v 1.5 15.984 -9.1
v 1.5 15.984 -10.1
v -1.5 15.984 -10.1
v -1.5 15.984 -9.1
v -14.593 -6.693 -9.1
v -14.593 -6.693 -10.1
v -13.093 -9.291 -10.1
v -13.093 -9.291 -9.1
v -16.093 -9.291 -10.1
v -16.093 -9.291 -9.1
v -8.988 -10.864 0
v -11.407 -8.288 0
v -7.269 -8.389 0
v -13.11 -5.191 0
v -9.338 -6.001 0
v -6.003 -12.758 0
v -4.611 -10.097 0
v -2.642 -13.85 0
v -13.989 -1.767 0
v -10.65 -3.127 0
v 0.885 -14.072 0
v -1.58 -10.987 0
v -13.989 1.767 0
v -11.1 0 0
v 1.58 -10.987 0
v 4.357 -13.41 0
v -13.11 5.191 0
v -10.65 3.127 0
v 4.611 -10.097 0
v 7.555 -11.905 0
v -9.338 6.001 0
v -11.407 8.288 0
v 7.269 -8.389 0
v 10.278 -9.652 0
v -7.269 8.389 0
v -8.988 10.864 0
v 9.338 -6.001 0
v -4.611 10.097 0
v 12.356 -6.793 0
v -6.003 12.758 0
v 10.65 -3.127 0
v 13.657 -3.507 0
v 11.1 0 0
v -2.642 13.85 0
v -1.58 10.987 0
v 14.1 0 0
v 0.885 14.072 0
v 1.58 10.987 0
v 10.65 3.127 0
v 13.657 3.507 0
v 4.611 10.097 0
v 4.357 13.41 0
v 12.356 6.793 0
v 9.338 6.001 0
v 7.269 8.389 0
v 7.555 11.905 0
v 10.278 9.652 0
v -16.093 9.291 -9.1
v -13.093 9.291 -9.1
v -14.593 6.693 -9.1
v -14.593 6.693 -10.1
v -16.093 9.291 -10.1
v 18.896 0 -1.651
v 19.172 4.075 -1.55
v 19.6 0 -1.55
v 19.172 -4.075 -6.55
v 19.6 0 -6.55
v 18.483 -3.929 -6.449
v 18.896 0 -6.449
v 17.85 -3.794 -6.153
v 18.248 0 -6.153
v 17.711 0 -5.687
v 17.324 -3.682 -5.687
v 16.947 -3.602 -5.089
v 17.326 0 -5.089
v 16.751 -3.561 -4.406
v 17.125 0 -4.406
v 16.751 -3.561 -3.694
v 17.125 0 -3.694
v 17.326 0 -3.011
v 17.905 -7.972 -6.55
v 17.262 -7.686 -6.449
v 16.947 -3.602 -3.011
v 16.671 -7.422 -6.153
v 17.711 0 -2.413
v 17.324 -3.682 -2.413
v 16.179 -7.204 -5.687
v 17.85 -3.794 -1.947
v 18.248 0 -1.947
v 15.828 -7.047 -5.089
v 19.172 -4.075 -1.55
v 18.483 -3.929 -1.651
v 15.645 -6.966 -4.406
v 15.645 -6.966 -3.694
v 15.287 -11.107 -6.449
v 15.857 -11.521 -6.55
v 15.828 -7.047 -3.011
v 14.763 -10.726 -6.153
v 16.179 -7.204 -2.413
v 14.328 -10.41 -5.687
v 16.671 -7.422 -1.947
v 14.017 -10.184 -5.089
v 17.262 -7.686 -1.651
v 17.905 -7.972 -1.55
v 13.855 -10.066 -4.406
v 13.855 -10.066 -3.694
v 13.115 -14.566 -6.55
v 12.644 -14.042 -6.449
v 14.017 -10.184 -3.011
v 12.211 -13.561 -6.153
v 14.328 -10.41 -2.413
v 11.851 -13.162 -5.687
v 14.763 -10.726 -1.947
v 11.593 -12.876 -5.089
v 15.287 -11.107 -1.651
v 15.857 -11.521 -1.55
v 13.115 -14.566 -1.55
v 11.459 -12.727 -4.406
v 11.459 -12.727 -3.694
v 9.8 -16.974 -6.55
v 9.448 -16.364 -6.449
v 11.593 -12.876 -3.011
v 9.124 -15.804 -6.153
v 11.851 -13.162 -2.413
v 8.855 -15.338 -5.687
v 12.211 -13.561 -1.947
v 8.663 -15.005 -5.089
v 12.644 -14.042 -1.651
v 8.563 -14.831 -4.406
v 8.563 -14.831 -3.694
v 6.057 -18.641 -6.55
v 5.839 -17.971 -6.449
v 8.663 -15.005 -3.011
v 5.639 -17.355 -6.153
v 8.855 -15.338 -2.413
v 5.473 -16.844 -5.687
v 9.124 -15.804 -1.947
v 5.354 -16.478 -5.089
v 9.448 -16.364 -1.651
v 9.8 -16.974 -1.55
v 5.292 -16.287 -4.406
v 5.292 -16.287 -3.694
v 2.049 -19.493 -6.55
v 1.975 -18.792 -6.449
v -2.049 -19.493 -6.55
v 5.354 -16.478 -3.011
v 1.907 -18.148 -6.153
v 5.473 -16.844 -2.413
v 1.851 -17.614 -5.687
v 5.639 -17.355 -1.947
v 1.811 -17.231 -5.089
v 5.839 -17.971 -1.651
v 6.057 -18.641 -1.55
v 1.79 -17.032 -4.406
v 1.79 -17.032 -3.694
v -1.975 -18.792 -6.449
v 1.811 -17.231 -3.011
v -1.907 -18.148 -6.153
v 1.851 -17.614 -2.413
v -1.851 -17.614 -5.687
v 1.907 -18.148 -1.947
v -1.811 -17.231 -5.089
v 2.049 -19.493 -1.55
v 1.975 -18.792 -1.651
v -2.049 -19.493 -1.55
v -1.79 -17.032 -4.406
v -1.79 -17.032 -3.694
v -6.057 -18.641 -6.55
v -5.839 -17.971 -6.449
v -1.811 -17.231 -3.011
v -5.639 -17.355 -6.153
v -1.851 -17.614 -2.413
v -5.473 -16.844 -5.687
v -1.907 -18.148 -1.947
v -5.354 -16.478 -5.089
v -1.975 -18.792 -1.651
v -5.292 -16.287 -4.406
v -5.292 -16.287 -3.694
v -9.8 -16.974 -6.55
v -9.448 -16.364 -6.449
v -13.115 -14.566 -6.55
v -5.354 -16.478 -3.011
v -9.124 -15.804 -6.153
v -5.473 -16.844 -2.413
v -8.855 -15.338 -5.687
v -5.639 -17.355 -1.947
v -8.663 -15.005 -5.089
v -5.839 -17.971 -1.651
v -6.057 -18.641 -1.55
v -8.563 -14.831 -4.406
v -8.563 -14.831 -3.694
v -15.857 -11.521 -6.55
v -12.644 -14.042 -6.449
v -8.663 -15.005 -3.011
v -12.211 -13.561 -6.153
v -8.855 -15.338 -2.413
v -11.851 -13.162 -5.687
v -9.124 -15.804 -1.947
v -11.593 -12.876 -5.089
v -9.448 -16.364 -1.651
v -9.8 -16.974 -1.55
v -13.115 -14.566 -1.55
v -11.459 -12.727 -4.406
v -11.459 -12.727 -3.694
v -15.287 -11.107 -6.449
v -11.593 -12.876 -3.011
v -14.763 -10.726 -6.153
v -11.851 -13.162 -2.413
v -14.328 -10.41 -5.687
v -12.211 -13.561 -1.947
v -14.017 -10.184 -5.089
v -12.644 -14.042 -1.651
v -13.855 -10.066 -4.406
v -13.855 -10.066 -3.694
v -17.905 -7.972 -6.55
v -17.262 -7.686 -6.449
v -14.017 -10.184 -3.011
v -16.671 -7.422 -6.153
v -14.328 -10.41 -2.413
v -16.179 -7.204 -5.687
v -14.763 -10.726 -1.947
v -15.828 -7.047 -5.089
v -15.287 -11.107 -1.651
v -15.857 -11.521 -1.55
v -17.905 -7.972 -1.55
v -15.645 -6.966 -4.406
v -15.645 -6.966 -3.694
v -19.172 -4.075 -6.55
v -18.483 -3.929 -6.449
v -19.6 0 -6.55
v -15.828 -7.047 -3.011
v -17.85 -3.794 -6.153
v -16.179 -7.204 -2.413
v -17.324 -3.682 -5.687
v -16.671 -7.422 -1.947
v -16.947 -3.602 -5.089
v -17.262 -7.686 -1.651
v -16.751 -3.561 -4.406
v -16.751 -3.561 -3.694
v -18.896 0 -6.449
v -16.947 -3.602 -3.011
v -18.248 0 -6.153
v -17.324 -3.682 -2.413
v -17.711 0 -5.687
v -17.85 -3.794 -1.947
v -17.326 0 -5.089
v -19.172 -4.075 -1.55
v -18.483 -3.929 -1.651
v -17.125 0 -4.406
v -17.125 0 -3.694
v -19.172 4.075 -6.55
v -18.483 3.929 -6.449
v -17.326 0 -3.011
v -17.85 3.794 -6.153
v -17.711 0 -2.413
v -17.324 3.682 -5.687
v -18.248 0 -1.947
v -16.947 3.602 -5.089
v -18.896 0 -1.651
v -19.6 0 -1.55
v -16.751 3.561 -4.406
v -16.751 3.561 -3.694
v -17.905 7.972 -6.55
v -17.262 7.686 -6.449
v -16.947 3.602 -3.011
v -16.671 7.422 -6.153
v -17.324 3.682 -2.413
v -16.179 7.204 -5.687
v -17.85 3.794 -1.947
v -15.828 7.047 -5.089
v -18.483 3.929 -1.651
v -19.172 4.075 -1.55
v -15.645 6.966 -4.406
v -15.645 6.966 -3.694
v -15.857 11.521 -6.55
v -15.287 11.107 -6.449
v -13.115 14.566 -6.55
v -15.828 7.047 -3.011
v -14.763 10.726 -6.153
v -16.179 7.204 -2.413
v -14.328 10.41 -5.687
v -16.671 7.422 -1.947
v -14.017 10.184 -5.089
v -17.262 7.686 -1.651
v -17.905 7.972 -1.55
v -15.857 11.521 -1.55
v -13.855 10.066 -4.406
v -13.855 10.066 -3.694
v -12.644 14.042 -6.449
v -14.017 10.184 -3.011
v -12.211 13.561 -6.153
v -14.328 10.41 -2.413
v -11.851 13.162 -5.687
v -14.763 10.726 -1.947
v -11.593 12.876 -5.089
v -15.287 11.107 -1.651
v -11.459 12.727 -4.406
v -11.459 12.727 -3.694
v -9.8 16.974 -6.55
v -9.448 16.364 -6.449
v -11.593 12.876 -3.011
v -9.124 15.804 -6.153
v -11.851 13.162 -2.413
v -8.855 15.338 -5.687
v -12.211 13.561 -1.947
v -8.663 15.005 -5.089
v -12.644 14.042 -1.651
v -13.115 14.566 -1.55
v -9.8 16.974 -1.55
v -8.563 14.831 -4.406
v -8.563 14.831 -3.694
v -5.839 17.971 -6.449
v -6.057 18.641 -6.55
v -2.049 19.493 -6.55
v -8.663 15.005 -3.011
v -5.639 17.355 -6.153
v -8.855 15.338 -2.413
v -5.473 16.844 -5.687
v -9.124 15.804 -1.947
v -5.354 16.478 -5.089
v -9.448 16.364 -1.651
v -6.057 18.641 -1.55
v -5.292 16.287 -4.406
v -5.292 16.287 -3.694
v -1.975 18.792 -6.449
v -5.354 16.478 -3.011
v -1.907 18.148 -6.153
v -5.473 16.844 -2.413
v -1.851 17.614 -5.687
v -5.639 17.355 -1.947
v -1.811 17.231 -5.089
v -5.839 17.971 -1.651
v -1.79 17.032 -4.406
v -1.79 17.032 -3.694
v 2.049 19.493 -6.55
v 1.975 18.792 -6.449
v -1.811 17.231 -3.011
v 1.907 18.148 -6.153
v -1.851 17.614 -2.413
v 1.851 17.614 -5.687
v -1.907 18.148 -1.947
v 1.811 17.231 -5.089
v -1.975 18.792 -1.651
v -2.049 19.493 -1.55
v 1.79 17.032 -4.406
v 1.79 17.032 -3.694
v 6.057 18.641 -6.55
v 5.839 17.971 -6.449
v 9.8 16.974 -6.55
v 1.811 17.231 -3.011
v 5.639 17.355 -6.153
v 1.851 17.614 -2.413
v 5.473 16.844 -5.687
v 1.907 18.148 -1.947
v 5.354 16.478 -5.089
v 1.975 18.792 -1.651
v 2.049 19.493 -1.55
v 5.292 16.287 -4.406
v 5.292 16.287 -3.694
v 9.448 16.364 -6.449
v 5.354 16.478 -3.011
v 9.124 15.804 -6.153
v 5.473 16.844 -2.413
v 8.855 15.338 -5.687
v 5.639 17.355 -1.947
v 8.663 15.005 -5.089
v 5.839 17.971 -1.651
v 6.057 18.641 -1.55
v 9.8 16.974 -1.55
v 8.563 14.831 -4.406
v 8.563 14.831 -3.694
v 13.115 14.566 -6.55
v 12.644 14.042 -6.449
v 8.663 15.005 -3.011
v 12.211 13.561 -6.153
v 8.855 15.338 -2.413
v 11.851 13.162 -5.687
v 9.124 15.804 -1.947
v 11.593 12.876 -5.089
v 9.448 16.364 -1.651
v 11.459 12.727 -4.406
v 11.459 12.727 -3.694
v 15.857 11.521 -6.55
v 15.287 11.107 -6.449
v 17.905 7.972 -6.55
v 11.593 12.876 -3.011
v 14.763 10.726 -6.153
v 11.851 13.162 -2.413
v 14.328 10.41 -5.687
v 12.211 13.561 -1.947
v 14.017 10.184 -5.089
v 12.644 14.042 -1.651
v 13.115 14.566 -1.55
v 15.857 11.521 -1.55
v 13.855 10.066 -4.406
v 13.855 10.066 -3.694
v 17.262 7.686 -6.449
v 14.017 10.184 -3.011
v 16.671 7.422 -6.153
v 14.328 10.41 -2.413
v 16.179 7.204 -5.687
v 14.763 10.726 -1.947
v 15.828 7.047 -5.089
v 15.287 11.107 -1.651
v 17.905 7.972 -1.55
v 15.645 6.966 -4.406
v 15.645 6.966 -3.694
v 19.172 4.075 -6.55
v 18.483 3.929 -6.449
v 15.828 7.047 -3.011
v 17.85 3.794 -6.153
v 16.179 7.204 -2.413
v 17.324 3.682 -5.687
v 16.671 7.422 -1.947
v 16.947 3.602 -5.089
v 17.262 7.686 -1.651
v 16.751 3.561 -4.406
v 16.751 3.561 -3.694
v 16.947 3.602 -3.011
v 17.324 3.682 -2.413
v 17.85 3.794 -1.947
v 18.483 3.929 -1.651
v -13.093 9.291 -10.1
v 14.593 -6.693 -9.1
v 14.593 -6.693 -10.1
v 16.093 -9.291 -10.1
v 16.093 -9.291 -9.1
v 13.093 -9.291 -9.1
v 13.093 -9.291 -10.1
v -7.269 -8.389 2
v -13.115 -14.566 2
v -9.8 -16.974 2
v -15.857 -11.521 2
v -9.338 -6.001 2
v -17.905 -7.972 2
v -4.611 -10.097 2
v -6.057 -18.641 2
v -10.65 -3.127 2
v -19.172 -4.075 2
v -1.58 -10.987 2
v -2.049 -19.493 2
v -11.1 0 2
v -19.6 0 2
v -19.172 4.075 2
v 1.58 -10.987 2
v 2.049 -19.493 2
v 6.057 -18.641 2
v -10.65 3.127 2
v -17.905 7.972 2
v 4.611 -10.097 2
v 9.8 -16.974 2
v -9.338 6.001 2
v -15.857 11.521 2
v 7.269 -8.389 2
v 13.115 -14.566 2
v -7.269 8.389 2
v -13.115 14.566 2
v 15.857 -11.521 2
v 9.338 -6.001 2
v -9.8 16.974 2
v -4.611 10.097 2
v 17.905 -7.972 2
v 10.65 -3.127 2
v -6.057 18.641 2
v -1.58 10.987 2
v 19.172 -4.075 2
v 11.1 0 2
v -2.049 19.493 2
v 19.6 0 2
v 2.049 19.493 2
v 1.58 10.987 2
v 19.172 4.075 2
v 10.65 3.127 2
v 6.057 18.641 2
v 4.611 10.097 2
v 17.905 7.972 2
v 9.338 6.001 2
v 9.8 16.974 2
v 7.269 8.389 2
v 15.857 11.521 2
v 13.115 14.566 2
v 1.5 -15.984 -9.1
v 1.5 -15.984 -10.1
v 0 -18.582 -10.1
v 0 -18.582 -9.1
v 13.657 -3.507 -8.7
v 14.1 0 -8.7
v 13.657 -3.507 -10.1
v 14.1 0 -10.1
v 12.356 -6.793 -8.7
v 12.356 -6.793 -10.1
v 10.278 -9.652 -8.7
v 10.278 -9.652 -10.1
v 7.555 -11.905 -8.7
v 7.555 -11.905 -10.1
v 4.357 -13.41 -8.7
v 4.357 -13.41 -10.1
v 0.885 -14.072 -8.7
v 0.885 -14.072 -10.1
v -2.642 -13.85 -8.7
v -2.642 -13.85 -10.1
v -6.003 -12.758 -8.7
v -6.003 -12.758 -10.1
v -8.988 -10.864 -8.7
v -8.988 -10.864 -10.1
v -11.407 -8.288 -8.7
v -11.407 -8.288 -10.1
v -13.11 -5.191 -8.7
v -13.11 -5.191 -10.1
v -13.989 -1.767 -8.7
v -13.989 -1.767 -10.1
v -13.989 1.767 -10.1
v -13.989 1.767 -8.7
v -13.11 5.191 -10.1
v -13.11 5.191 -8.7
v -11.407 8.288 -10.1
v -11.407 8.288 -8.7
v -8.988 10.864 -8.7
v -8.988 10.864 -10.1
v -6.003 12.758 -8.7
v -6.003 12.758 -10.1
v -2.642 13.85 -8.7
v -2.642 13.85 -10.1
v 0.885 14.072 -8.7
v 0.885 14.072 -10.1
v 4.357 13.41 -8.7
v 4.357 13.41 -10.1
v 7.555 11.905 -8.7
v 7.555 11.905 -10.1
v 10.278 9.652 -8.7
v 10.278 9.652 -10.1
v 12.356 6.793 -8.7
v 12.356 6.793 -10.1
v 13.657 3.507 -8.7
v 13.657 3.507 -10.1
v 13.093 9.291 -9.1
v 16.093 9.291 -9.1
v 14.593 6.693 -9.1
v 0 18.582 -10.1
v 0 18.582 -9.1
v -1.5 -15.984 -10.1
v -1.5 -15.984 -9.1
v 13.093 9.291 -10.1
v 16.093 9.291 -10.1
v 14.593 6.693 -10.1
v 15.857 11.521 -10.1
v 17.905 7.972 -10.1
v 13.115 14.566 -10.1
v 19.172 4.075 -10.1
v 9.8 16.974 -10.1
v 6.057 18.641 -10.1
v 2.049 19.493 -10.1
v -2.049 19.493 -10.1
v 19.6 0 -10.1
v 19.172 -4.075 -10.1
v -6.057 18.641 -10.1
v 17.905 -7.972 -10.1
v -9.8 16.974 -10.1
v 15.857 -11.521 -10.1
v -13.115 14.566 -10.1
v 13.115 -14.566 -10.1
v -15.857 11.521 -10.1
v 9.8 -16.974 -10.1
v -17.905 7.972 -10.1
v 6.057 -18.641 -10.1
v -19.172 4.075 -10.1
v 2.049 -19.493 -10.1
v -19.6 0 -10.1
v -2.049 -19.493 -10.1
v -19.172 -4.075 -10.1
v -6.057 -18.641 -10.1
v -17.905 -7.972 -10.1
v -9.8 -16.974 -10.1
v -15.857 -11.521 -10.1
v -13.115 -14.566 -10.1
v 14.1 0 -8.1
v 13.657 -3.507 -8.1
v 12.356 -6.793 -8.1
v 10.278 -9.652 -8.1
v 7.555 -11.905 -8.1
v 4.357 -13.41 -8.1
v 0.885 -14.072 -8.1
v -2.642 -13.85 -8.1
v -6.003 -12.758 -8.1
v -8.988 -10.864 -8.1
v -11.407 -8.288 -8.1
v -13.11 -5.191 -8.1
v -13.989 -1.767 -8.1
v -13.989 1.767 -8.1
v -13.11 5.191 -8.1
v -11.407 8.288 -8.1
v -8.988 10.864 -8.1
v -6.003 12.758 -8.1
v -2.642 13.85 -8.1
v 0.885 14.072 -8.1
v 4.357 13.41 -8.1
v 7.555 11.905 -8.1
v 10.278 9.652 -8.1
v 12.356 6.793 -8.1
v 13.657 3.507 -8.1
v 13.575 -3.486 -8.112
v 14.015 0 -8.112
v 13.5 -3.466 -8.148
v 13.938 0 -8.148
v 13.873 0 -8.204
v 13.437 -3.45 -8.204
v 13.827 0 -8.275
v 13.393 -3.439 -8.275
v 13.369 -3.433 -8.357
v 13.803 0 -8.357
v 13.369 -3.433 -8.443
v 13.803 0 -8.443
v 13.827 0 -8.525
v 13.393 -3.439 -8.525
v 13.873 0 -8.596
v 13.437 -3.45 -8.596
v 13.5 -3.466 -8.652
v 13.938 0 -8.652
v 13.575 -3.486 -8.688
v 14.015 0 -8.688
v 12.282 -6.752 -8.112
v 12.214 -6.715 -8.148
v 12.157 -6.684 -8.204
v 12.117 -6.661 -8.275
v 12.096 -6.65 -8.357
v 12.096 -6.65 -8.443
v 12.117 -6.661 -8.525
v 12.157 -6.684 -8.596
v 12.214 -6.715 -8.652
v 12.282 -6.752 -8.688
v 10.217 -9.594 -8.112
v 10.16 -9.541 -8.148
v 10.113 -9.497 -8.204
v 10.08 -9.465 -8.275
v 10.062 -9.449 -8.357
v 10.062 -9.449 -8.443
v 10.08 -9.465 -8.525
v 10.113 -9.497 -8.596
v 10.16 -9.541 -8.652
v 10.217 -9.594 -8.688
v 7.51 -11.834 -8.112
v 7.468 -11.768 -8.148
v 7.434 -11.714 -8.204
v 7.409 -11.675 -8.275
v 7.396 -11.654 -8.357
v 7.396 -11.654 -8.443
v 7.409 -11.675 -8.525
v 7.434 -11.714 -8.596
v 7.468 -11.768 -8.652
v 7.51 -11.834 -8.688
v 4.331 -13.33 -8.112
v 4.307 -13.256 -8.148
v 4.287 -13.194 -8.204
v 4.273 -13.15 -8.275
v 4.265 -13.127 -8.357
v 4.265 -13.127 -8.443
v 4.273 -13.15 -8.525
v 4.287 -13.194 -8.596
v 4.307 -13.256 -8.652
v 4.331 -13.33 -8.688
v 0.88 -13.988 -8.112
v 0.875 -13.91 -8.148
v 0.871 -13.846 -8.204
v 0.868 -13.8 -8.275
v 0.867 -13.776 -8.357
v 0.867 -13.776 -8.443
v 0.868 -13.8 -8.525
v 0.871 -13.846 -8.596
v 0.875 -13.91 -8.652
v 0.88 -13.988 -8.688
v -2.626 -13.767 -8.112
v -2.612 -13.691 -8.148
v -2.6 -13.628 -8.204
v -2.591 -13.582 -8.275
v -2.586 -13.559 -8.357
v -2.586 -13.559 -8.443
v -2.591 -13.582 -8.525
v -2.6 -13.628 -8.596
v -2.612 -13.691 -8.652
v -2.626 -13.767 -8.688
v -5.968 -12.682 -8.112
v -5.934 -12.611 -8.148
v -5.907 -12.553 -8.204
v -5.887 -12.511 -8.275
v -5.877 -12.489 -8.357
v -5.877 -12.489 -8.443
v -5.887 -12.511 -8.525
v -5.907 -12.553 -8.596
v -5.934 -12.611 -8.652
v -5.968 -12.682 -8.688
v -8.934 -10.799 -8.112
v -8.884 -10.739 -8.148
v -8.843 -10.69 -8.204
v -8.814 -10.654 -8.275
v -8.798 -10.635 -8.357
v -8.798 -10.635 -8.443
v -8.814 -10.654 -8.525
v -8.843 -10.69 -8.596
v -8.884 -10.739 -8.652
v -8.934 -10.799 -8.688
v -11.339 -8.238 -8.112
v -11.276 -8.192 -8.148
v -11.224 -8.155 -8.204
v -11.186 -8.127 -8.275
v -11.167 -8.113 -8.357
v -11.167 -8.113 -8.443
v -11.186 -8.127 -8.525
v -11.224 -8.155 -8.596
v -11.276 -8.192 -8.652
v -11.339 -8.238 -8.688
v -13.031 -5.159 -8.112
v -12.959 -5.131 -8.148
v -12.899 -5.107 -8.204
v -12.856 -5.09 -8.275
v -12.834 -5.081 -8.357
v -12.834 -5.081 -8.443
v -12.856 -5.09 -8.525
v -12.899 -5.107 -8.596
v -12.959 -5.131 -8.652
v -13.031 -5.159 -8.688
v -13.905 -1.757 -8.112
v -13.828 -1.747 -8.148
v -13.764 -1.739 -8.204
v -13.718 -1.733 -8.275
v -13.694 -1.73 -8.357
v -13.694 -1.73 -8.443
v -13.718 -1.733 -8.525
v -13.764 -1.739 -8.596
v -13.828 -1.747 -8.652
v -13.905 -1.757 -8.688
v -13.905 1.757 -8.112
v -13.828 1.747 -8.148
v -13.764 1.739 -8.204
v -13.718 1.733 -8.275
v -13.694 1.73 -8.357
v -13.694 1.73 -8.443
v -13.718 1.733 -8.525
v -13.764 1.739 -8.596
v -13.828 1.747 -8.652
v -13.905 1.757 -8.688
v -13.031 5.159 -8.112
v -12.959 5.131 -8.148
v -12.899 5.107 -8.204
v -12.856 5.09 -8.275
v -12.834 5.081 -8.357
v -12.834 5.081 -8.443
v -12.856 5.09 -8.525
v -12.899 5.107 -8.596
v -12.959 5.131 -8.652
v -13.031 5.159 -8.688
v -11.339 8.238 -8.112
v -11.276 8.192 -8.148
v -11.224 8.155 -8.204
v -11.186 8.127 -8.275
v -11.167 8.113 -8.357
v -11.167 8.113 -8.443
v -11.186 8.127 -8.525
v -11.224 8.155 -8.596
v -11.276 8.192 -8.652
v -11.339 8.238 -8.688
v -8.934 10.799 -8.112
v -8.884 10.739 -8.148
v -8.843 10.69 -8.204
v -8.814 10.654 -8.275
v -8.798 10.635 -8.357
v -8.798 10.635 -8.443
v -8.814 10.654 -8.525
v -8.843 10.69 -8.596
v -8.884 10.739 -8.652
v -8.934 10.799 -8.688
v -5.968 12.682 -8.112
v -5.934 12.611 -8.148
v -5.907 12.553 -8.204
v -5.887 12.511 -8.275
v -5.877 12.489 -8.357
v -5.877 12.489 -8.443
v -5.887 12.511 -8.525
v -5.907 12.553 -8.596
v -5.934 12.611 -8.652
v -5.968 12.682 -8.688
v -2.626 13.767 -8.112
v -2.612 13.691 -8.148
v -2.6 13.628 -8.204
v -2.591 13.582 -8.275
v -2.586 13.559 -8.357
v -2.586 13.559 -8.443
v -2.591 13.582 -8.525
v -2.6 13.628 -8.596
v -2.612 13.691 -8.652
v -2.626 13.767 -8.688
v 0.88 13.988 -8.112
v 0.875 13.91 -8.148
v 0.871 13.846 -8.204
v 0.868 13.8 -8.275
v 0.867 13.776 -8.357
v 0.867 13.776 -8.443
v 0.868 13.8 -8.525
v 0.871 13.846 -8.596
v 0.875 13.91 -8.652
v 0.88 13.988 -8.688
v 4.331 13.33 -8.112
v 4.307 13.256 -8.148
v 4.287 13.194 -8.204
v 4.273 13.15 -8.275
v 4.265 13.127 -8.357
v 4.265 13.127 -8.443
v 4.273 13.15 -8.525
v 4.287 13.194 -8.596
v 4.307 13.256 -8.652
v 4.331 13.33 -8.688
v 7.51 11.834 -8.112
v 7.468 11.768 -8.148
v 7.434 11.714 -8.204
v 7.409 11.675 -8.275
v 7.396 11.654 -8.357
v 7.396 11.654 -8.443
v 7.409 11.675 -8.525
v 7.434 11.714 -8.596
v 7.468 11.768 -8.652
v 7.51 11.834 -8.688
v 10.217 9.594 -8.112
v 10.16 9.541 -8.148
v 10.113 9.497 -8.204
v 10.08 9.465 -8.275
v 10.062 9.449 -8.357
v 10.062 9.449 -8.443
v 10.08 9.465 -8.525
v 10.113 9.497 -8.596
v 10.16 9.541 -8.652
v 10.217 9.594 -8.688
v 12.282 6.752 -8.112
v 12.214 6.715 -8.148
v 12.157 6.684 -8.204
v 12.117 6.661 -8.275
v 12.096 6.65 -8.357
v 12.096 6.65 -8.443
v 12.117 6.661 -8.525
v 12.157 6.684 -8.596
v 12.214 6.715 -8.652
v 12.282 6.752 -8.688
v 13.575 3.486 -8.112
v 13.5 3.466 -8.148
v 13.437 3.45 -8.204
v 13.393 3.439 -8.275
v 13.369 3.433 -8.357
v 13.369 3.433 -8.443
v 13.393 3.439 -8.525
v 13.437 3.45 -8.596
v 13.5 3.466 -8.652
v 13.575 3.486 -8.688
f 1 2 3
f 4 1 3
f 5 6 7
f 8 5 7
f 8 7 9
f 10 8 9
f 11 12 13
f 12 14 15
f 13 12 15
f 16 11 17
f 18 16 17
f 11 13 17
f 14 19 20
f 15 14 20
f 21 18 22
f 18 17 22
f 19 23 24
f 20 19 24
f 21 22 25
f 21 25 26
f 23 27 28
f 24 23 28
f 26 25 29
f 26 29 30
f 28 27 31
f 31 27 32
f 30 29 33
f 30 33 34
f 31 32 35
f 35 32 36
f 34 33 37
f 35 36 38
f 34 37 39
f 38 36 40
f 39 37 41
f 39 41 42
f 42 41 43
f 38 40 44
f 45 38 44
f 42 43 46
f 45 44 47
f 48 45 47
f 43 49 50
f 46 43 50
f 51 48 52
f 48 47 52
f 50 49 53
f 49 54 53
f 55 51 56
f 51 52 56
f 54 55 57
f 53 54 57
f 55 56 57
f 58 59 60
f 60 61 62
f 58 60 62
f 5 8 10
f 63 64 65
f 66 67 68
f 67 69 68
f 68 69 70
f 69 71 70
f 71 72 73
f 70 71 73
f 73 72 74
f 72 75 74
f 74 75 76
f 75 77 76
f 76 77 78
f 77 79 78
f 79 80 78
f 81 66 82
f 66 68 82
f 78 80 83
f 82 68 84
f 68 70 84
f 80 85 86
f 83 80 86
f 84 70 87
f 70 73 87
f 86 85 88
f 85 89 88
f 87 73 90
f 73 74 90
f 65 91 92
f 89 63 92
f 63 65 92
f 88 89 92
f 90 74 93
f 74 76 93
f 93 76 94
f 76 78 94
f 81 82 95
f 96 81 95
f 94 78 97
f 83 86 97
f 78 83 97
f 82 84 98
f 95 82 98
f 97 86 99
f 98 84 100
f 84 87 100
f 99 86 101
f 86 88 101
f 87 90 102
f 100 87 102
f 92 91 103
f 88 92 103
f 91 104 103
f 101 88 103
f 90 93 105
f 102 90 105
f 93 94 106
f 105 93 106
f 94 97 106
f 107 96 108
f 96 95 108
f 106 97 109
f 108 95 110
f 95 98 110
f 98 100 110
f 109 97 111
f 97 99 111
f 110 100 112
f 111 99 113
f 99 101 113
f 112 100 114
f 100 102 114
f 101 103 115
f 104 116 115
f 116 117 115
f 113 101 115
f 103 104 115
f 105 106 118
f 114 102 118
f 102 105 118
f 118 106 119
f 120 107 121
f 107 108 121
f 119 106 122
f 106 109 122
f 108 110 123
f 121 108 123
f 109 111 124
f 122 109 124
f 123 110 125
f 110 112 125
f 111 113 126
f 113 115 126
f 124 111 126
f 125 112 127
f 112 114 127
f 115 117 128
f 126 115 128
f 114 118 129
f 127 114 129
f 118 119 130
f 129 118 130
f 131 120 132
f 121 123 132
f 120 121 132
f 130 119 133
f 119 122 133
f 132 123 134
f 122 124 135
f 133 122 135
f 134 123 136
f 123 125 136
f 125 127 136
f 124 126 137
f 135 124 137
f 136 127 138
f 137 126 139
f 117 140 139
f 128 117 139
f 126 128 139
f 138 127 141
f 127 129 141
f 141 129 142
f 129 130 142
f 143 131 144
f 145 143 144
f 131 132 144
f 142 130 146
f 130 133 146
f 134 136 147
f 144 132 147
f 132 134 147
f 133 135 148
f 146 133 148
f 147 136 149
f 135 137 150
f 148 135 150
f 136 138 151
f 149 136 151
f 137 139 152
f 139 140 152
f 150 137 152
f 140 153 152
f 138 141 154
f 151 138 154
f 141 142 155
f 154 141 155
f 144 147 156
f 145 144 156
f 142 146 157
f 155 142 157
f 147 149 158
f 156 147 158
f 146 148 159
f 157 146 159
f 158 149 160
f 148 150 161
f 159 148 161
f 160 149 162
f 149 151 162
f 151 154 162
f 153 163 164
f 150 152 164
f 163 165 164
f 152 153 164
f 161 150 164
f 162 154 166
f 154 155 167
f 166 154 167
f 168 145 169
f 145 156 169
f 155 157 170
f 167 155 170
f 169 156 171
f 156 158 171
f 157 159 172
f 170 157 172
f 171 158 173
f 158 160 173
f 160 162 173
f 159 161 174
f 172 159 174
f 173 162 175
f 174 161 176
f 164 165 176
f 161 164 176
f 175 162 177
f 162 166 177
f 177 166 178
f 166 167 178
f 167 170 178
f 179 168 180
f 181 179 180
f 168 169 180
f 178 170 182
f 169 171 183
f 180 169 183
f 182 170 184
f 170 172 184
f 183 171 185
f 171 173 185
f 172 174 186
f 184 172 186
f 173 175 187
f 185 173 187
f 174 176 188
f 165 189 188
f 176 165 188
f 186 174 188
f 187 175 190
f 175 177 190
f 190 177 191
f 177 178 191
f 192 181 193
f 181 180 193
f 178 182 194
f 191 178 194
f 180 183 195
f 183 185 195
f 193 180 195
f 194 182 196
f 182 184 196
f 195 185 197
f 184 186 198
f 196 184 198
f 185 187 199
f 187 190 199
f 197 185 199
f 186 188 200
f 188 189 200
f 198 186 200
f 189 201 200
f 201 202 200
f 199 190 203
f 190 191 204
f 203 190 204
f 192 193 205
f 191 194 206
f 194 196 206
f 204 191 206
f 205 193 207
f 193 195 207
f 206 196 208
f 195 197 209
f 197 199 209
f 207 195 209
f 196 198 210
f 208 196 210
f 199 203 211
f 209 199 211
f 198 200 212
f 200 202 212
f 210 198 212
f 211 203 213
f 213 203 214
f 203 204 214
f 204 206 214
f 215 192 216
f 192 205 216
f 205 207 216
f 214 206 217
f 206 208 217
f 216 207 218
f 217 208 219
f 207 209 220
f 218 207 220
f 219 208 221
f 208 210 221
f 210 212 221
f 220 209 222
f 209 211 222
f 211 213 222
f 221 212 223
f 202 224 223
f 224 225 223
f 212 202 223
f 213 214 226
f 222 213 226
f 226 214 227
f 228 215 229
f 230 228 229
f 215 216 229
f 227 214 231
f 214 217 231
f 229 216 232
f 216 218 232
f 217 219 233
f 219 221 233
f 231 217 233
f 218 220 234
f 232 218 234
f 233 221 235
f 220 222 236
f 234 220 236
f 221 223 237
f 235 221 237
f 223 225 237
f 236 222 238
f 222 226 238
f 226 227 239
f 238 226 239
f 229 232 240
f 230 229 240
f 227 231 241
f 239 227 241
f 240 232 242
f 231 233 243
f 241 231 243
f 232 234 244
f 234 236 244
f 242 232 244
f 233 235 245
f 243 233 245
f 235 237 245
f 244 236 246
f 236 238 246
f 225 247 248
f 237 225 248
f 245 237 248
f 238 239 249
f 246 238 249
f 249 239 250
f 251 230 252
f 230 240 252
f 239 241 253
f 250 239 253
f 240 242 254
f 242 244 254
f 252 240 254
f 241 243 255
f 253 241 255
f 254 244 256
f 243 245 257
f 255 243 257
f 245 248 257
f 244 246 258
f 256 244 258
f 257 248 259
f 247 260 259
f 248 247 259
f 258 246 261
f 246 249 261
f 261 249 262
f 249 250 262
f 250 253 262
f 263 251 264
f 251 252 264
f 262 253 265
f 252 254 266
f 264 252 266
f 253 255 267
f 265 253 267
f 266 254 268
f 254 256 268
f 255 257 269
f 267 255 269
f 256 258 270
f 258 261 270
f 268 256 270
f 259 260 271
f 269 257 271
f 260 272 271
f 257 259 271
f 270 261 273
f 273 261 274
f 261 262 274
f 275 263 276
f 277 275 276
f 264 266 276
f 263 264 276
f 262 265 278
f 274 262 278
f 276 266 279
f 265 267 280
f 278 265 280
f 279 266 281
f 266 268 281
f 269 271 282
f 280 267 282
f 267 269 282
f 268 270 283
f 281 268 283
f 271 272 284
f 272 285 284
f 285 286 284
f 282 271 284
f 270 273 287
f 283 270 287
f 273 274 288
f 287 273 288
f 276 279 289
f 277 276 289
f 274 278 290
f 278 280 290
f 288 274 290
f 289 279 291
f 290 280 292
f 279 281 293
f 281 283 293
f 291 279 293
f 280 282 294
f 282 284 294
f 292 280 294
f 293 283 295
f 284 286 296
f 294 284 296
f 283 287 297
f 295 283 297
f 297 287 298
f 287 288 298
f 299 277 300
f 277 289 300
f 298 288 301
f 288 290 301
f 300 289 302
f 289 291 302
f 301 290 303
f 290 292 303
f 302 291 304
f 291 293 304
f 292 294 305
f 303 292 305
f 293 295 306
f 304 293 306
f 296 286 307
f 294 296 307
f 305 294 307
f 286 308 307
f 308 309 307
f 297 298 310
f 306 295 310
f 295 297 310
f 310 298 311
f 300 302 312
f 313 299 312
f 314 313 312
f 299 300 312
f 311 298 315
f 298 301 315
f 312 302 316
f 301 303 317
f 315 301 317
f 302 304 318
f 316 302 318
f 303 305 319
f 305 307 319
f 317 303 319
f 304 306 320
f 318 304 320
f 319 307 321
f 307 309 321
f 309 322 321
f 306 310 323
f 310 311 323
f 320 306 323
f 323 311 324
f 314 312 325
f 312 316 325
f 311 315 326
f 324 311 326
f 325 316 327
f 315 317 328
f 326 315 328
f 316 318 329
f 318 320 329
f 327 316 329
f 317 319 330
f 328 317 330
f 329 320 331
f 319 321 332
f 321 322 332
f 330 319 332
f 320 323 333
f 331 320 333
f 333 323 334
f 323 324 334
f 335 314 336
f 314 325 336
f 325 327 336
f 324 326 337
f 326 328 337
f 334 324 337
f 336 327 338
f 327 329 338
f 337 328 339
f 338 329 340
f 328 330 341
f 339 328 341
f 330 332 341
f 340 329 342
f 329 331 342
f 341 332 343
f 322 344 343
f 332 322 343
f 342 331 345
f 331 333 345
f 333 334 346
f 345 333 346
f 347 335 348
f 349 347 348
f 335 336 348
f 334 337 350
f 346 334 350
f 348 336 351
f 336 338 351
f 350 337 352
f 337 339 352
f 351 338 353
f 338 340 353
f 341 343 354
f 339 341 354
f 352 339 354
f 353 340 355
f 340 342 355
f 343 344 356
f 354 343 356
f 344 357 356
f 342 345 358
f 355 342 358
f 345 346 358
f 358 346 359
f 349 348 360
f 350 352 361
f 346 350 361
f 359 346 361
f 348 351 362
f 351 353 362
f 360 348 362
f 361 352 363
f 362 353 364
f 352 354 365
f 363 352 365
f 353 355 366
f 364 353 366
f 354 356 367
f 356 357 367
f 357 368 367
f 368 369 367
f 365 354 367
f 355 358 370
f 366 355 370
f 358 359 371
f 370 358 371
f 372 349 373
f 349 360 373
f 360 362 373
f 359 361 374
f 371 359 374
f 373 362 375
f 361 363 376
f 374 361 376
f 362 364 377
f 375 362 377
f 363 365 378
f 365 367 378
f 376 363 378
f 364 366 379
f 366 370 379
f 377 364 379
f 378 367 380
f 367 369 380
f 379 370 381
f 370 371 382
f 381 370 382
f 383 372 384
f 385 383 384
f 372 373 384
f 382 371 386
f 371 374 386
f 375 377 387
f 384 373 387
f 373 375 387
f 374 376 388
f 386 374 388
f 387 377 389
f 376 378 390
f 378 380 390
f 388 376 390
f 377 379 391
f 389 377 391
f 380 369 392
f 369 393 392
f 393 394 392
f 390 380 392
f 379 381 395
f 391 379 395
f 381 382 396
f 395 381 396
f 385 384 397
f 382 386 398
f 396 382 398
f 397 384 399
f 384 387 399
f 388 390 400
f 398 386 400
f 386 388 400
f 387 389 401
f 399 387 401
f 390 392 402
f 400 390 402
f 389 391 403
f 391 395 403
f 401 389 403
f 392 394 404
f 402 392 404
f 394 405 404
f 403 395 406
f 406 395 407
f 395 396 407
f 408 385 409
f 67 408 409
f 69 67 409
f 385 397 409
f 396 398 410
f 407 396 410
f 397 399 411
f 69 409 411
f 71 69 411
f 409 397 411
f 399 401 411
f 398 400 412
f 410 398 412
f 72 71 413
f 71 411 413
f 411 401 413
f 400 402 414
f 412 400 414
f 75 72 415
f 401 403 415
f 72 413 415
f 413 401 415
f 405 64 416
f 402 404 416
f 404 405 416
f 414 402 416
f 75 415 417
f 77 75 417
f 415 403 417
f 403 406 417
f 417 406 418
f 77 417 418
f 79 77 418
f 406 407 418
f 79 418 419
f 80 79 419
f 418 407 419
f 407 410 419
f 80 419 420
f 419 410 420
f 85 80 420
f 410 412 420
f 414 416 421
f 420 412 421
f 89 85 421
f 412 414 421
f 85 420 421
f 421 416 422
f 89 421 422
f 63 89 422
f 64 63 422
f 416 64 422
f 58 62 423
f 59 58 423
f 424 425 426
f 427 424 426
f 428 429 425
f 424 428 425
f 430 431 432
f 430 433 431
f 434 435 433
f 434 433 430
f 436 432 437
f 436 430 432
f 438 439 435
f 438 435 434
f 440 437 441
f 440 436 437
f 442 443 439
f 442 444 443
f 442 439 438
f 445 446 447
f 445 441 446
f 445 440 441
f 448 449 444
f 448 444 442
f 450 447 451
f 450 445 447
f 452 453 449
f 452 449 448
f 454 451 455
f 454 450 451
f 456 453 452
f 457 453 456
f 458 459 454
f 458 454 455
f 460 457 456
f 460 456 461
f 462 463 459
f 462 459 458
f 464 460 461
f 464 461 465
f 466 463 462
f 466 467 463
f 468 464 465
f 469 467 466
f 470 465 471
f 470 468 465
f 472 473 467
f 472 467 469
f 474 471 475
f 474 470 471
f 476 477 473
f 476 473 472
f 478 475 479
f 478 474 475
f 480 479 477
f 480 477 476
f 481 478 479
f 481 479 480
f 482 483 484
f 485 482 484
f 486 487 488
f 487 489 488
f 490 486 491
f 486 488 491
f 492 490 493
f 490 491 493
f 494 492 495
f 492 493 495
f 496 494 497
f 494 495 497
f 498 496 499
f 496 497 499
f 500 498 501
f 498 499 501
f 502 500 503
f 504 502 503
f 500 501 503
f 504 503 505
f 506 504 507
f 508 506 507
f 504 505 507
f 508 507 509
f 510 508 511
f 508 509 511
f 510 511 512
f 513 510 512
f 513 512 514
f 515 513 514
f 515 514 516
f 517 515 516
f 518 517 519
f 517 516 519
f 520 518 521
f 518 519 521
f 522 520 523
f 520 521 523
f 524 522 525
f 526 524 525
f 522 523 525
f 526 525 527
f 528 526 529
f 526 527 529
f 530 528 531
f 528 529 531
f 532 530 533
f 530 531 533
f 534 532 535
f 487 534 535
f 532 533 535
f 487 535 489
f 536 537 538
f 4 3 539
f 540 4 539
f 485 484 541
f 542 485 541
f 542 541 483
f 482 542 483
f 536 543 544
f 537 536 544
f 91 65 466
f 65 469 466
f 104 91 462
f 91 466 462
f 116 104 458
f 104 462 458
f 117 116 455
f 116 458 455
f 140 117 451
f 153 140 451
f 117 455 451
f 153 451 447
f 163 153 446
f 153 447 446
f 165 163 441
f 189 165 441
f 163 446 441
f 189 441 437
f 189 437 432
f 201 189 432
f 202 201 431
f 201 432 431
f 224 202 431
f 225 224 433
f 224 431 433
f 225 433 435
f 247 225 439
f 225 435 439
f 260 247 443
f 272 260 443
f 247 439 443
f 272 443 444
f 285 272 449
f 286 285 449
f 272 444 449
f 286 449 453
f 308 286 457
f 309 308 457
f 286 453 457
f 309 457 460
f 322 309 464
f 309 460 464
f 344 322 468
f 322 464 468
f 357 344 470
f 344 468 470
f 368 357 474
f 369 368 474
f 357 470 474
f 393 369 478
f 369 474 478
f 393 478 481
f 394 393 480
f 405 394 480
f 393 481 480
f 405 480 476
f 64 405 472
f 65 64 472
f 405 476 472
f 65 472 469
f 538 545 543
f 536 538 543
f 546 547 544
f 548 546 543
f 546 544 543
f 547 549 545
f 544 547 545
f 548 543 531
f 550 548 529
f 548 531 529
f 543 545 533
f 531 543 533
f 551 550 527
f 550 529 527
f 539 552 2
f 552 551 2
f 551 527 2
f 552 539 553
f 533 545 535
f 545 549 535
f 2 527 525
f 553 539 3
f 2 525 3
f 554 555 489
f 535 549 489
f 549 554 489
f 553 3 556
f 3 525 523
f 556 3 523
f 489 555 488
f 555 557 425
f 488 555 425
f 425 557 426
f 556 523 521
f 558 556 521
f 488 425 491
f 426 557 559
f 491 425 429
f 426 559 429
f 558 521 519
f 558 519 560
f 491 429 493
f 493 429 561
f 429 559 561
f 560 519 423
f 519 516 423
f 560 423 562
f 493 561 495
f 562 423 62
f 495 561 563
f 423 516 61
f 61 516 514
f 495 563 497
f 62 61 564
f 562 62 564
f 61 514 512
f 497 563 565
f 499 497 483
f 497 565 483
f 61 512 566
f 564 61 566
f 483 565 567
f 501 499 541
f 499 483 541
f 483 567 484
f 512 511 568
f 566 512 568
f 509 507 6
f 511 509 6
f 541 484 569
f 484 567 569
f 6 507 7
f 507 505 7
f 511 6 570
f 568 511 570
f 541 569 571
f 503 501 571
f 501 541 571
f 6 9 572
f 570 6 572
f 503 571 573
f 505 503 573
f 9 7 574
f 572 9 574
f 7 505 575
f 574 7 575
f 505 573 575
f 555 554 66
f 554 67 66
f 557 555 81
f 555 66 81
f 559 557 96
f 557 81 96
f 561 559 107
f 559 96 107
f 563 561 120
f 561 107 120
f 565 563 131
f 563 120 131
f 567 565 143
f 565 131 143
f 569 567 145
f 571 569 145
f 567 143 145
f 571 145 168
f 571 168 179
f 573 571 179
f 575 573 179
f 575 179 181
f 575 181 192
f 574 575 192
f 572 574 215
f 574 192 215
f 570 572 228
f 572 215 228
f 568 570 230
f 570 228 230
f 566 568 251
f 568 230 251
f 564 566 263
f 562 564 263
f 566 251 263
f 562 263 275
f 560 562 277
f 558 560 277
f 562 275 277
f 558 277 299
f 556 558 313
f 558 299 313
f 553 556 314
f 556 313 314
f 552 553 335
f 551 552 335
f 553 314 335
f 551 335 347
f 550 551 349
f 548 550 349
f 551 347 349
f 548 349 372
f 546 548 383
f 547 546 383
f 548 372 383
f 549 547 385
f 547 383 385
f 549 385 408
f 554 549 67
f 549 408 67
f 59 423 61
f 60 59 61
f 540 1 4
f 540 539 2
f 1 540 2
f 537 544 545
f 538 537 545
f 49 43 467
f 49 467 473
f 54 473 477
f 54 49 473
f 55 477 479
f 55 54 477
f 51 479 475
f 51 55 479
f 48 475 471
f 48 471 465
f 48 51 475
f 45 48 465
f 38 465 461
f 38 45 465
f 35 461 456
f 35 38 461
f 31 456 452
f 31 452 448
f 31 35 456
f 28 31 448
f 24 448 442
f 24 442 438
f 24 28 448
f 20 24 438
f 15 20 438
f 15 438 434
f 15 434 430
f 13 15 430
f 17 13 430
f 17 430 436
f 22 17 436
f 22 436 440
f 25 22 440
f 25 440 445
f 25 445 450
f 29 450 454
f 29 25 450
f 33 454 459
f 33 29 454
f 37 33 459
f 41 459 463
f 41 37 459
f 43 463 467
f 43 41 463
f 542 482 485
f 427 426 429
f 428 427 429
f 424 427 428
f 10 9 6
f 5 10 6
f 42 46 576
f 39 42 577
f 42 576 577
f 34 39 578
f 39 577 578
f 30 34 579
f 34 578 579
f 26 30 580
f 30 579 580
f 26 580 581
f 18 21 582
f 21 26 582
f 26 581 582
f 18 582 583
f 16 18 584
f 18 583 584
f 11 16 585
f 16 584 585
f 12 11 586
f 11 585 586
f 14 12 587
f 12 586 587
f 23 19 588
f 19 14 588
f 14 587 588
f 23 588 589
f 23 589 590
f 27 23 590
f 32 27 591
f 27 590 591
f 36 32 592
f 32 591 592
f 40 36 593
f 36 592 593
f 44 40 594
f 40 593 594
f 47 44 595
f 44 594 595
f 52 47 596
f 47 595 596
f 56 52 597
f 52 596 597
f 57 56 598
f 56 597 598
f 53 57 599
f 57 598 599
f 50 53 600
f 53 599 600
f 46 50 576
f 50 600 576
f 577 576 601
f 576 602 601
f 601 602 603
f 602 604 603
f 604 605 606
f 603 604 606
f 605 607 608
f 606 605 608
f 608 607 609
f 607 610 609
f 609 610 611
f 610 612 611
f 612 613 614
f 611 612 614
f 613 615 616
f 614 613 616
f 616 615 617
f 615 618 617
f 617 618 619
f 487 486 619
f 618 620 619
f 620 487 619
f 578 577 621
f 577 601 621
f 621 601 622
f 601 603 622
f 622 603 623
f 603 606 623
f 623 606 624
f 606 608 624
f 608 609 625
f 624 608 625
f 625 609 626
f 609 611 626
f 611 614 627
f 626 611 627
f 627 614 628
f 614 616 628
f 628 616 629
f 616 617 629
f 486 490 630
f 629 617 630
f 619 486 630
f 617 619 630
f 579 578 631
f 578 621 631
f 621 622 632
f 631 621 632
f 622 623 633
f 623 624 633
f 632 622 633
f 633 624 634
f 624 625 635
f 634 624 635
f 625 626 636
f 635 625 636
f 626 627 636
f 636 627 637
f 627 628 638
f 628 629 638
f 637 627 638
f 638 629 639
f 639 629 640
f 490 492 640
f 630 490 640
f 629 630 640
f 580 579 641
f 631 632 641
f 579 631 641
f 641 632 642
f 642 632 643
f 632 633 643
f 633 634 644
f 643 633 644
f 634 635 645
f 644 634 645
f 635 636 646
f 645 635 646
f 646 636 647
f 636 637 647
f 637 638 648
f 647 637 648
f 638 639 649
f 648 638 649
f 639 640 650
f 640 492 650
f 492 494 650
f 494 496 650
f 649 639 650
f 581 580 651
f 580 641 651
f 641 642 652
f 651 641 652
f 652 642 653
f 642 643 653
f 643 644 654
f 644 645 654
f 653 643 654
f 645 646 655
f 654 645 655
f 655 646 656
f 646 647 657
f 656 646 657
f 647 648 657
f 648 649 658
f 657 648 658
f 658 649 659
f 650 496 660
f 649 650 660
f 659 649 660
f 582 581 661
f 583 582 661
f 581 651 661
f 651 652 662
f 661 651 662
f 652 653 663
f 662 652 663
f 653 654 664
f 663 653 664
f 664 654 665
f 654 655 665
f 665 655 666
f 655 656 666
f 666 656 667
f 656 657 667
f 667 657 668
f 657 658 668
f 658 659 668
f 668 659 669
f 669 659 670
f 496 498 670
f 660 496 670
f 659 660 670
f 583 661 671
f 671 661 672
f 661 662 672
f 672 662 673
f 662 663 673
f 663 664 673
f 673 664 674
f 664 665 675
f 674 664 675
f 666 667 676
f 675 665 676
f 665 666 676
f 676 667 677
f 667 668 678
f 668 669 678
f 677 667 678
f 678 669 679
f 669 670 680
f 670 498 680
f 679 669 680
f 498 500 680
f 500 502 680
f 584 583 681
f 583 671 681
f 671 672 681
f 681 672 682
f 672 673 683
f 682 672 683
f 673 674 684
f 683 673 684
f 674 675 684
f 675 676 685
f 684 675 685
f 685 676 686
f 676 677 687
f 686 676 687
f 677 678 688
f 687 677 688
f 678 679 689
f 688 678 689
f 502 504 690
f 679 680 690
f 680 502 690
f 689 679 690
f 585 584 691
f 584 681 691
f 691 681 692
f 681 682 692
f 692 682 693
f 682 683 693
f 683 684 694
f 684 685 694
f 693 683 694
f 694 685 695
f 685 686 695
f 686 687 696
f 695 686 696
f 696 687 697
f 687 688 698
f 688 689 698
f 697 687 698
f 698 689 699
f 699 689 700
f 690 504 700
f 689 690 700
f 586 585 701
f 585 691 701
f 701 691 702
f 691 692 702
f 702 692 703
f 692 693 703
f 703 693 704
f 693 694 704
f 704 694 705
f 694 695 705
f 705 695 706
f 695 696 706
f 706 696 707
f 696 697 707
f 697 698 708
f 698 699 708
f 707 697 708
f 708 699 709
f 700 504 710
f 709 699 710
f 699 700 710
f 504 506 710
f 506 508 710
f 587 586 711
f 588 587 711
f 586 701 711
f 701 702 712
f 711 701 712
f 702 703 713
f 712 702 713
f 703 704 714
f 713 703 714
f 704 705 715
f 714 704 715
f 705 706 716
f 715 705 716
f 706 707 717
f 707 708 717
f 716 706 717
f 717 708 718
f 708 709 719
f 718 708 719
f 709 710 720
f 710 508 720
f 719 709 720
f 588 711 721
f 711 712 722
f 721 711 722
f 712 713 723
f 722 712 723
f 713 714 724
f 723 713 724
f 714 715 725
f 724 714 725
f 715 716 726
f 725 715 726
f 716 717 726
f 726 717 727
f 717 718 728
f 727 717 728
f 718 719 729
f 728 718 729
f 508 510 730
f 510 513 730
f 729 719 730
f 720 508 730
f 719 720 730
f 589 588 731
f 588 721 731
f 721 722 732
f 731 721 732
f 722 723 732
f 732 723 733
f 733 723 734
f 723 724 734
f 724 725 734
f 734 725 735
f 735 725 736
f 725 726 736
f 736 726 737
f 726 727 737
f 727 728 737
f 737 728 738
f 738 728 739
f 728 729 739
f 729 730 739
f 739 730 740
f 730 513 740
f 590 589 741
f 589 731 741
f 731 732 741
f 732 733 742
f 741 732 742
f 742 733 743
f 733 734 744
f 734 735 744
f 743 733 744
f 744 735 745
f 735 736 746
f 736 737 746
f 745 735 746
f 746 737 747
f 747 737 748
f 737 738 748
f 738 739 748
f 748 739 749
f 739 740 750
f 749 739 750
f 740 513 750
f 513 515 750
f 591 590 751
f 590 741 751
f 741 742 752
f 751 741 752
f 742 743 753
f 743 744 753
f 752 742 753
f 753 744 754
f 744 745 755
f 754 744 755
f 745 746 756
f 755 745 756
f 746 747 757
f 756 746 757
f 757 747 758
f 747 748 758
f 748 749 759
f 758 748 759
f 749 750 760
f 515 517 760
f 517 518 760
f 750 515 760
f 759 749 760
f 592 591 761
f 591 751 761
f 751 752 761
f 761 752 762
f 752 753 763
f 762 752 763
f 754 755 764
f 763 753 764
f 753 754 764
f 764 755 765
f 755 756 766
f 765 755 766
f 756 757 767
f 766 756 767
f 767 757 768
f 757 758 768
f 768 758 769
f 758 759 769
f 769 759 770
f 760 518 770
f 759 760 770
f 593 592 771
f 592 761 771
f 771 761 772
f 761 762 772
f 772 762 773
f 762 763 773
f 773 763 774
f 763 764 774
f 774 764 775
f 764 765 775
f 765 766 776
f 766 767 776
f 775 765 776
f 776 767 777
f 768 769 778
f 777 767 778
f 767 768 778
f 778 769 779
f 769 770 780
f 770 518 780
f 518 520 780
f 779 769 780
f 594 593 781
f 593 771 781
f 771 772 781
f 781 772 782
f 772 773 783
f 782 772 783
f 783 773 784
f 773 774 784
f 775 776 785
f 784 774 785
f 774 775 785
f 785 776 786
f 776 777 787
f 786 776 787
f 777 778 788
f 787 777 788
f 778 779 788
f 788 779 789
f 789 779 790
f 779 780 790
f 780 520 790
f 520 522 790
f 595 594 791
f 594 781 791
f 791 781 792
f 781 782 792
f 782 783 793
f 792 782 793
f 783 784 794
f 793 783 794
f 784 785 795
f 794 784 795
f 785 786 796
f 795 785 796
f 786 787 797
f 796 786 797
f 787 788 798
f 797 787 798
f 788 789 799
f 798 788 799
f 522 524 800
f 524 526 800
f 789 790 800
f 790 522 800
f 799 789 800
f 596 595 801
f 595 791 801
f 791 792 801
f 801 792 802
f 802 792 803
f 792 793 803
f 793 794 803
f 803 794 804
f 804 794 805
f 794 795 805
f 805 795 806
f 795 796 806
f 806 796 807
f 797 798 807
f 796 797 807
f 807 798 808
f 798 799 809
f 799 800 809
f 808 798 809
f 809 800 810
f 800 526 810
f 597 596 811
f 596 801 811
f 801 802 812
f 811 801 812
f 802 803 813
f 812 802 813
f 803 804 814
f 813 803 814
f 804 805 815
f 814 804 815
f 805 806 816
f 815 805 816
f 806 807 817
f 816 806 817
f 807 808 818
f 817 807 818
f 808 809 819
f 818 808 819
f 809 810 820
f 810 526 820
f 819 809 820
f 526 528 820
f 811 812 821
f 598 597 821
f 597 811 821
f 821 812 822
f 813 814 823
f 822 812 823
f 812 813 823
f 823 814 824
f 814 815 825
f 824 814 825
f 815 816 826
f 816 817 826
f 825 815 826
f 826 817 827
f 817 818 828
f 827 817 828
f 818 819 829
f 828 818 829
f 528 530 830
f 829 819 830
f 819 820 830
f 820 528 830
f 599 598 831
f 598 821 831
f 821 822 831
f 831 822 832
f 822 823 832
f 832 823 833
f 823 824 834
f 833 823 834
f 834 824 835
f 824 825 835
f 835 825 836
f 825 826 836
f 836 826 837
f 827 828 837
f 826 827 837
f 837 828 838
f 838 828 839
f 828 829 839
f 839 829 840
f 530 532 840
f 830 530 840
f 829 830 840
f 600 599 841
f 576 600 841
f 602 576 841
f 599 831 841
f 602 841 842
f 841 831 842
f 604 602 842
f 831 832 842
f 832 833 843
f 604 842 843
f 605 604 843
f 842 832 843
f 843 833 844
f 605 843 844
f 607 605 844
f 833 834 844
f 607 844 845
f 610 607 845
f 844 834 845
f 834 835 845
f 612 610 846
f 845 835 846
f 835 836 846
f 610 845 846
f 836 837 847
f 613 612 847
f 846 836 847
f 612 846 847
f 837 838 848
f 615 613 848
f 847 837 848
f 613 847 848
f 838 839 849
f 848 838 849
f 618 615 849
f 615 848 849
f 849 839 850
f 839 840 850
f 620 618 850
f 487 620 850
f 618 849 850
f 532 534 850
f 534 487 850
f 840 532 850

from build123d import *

# Parameters (mm, degrees)
CROQUIS1_R              = 14.1
CROQUIS1_R_2            = 11.1
SALIENTE_EXTRUIR1_DEPTH = 2
CORTAR_EXTRUIR1_DEPTH   = 1


with BuildPart() as part:
    # Croquis1 → Saliente-Extruir1 (new body)
    with BuildSketch(Plane.XY):
        Circle(CROQUIS1_R)
        Circle(CROQUIS1_R_2, mode=Mode.SUBTRACT)
    extrude(amount=SALIENTE_EXTRUIR1_DEPTH)

    # Croquis4 → Revolución1 (revolve)
    with BuildSketch(Plane(origin=(0, 0, 0), x_dir=(1, 0, 0), z_dir=(0, 1, 0))):
        with BuildLine():
            Line((14.1, -2), (14.1, 0))
            Line((14.1, 0), (14.1, 8.1))
            ThreePointArc((14.1, 8.1), (13.8, 8.4), (14.1, 8.7))
            Line((14.1, 8.7), (14.1, 10.1))
            Line((14.1, 10.1), (19.6, 10.1))
            Line((19.6, 10.1), (19.6, 6.55))
            ThreePointArc((19.6, 6.55), (17.1, 4.05), (19.6, 1.55))
            Line((19.6, 1.55), (19.6, -2))
            Line((19.6, -2), (14.1, -2))
        make_face()
    revolve(axis=Axis((0, 0, 0), (0, 0, -1)))

    # Croquis7 → Cortar-Extruir1 (cut)
    with BuildSketch(Plane(origin=(0, 0, -10.1), x_dir=(-1, 0, 0), z_dir=(0, 0, -1))):
        Polygon((14.592528054, 6.692949192), (16.092528054, 9.291025404), (13.092528054, 9.291025404), align=None)
        Polygon((1.5, 15.983974596), (0, 18.582050808), (-1.5, 15.983974596), align=None)
        Polygon((13.092528054, -9.291025404), (16.092528054, -9.291025404), (14.592528054, -6.692949192), align=None)
        Polygon((-1.5, -15.983974596), (0, -18.582050808), (1.5, -15.983974596), align=None)
        Polygon((-14.592528054, -6.692949192), (-16.092528054, -9.291025404), (-13.092528054, -9.291025404), align=None)
        Polygon((-13.092528054, 9.291025404), (-16.092528054, 9.291025404), (-14.592528054, 6.692949192), align=None)
    extrude(amount=-CORTAR_EXTRUIR1_DEPTH, mode=Mode.SUBTRACT)


solid = part.part
